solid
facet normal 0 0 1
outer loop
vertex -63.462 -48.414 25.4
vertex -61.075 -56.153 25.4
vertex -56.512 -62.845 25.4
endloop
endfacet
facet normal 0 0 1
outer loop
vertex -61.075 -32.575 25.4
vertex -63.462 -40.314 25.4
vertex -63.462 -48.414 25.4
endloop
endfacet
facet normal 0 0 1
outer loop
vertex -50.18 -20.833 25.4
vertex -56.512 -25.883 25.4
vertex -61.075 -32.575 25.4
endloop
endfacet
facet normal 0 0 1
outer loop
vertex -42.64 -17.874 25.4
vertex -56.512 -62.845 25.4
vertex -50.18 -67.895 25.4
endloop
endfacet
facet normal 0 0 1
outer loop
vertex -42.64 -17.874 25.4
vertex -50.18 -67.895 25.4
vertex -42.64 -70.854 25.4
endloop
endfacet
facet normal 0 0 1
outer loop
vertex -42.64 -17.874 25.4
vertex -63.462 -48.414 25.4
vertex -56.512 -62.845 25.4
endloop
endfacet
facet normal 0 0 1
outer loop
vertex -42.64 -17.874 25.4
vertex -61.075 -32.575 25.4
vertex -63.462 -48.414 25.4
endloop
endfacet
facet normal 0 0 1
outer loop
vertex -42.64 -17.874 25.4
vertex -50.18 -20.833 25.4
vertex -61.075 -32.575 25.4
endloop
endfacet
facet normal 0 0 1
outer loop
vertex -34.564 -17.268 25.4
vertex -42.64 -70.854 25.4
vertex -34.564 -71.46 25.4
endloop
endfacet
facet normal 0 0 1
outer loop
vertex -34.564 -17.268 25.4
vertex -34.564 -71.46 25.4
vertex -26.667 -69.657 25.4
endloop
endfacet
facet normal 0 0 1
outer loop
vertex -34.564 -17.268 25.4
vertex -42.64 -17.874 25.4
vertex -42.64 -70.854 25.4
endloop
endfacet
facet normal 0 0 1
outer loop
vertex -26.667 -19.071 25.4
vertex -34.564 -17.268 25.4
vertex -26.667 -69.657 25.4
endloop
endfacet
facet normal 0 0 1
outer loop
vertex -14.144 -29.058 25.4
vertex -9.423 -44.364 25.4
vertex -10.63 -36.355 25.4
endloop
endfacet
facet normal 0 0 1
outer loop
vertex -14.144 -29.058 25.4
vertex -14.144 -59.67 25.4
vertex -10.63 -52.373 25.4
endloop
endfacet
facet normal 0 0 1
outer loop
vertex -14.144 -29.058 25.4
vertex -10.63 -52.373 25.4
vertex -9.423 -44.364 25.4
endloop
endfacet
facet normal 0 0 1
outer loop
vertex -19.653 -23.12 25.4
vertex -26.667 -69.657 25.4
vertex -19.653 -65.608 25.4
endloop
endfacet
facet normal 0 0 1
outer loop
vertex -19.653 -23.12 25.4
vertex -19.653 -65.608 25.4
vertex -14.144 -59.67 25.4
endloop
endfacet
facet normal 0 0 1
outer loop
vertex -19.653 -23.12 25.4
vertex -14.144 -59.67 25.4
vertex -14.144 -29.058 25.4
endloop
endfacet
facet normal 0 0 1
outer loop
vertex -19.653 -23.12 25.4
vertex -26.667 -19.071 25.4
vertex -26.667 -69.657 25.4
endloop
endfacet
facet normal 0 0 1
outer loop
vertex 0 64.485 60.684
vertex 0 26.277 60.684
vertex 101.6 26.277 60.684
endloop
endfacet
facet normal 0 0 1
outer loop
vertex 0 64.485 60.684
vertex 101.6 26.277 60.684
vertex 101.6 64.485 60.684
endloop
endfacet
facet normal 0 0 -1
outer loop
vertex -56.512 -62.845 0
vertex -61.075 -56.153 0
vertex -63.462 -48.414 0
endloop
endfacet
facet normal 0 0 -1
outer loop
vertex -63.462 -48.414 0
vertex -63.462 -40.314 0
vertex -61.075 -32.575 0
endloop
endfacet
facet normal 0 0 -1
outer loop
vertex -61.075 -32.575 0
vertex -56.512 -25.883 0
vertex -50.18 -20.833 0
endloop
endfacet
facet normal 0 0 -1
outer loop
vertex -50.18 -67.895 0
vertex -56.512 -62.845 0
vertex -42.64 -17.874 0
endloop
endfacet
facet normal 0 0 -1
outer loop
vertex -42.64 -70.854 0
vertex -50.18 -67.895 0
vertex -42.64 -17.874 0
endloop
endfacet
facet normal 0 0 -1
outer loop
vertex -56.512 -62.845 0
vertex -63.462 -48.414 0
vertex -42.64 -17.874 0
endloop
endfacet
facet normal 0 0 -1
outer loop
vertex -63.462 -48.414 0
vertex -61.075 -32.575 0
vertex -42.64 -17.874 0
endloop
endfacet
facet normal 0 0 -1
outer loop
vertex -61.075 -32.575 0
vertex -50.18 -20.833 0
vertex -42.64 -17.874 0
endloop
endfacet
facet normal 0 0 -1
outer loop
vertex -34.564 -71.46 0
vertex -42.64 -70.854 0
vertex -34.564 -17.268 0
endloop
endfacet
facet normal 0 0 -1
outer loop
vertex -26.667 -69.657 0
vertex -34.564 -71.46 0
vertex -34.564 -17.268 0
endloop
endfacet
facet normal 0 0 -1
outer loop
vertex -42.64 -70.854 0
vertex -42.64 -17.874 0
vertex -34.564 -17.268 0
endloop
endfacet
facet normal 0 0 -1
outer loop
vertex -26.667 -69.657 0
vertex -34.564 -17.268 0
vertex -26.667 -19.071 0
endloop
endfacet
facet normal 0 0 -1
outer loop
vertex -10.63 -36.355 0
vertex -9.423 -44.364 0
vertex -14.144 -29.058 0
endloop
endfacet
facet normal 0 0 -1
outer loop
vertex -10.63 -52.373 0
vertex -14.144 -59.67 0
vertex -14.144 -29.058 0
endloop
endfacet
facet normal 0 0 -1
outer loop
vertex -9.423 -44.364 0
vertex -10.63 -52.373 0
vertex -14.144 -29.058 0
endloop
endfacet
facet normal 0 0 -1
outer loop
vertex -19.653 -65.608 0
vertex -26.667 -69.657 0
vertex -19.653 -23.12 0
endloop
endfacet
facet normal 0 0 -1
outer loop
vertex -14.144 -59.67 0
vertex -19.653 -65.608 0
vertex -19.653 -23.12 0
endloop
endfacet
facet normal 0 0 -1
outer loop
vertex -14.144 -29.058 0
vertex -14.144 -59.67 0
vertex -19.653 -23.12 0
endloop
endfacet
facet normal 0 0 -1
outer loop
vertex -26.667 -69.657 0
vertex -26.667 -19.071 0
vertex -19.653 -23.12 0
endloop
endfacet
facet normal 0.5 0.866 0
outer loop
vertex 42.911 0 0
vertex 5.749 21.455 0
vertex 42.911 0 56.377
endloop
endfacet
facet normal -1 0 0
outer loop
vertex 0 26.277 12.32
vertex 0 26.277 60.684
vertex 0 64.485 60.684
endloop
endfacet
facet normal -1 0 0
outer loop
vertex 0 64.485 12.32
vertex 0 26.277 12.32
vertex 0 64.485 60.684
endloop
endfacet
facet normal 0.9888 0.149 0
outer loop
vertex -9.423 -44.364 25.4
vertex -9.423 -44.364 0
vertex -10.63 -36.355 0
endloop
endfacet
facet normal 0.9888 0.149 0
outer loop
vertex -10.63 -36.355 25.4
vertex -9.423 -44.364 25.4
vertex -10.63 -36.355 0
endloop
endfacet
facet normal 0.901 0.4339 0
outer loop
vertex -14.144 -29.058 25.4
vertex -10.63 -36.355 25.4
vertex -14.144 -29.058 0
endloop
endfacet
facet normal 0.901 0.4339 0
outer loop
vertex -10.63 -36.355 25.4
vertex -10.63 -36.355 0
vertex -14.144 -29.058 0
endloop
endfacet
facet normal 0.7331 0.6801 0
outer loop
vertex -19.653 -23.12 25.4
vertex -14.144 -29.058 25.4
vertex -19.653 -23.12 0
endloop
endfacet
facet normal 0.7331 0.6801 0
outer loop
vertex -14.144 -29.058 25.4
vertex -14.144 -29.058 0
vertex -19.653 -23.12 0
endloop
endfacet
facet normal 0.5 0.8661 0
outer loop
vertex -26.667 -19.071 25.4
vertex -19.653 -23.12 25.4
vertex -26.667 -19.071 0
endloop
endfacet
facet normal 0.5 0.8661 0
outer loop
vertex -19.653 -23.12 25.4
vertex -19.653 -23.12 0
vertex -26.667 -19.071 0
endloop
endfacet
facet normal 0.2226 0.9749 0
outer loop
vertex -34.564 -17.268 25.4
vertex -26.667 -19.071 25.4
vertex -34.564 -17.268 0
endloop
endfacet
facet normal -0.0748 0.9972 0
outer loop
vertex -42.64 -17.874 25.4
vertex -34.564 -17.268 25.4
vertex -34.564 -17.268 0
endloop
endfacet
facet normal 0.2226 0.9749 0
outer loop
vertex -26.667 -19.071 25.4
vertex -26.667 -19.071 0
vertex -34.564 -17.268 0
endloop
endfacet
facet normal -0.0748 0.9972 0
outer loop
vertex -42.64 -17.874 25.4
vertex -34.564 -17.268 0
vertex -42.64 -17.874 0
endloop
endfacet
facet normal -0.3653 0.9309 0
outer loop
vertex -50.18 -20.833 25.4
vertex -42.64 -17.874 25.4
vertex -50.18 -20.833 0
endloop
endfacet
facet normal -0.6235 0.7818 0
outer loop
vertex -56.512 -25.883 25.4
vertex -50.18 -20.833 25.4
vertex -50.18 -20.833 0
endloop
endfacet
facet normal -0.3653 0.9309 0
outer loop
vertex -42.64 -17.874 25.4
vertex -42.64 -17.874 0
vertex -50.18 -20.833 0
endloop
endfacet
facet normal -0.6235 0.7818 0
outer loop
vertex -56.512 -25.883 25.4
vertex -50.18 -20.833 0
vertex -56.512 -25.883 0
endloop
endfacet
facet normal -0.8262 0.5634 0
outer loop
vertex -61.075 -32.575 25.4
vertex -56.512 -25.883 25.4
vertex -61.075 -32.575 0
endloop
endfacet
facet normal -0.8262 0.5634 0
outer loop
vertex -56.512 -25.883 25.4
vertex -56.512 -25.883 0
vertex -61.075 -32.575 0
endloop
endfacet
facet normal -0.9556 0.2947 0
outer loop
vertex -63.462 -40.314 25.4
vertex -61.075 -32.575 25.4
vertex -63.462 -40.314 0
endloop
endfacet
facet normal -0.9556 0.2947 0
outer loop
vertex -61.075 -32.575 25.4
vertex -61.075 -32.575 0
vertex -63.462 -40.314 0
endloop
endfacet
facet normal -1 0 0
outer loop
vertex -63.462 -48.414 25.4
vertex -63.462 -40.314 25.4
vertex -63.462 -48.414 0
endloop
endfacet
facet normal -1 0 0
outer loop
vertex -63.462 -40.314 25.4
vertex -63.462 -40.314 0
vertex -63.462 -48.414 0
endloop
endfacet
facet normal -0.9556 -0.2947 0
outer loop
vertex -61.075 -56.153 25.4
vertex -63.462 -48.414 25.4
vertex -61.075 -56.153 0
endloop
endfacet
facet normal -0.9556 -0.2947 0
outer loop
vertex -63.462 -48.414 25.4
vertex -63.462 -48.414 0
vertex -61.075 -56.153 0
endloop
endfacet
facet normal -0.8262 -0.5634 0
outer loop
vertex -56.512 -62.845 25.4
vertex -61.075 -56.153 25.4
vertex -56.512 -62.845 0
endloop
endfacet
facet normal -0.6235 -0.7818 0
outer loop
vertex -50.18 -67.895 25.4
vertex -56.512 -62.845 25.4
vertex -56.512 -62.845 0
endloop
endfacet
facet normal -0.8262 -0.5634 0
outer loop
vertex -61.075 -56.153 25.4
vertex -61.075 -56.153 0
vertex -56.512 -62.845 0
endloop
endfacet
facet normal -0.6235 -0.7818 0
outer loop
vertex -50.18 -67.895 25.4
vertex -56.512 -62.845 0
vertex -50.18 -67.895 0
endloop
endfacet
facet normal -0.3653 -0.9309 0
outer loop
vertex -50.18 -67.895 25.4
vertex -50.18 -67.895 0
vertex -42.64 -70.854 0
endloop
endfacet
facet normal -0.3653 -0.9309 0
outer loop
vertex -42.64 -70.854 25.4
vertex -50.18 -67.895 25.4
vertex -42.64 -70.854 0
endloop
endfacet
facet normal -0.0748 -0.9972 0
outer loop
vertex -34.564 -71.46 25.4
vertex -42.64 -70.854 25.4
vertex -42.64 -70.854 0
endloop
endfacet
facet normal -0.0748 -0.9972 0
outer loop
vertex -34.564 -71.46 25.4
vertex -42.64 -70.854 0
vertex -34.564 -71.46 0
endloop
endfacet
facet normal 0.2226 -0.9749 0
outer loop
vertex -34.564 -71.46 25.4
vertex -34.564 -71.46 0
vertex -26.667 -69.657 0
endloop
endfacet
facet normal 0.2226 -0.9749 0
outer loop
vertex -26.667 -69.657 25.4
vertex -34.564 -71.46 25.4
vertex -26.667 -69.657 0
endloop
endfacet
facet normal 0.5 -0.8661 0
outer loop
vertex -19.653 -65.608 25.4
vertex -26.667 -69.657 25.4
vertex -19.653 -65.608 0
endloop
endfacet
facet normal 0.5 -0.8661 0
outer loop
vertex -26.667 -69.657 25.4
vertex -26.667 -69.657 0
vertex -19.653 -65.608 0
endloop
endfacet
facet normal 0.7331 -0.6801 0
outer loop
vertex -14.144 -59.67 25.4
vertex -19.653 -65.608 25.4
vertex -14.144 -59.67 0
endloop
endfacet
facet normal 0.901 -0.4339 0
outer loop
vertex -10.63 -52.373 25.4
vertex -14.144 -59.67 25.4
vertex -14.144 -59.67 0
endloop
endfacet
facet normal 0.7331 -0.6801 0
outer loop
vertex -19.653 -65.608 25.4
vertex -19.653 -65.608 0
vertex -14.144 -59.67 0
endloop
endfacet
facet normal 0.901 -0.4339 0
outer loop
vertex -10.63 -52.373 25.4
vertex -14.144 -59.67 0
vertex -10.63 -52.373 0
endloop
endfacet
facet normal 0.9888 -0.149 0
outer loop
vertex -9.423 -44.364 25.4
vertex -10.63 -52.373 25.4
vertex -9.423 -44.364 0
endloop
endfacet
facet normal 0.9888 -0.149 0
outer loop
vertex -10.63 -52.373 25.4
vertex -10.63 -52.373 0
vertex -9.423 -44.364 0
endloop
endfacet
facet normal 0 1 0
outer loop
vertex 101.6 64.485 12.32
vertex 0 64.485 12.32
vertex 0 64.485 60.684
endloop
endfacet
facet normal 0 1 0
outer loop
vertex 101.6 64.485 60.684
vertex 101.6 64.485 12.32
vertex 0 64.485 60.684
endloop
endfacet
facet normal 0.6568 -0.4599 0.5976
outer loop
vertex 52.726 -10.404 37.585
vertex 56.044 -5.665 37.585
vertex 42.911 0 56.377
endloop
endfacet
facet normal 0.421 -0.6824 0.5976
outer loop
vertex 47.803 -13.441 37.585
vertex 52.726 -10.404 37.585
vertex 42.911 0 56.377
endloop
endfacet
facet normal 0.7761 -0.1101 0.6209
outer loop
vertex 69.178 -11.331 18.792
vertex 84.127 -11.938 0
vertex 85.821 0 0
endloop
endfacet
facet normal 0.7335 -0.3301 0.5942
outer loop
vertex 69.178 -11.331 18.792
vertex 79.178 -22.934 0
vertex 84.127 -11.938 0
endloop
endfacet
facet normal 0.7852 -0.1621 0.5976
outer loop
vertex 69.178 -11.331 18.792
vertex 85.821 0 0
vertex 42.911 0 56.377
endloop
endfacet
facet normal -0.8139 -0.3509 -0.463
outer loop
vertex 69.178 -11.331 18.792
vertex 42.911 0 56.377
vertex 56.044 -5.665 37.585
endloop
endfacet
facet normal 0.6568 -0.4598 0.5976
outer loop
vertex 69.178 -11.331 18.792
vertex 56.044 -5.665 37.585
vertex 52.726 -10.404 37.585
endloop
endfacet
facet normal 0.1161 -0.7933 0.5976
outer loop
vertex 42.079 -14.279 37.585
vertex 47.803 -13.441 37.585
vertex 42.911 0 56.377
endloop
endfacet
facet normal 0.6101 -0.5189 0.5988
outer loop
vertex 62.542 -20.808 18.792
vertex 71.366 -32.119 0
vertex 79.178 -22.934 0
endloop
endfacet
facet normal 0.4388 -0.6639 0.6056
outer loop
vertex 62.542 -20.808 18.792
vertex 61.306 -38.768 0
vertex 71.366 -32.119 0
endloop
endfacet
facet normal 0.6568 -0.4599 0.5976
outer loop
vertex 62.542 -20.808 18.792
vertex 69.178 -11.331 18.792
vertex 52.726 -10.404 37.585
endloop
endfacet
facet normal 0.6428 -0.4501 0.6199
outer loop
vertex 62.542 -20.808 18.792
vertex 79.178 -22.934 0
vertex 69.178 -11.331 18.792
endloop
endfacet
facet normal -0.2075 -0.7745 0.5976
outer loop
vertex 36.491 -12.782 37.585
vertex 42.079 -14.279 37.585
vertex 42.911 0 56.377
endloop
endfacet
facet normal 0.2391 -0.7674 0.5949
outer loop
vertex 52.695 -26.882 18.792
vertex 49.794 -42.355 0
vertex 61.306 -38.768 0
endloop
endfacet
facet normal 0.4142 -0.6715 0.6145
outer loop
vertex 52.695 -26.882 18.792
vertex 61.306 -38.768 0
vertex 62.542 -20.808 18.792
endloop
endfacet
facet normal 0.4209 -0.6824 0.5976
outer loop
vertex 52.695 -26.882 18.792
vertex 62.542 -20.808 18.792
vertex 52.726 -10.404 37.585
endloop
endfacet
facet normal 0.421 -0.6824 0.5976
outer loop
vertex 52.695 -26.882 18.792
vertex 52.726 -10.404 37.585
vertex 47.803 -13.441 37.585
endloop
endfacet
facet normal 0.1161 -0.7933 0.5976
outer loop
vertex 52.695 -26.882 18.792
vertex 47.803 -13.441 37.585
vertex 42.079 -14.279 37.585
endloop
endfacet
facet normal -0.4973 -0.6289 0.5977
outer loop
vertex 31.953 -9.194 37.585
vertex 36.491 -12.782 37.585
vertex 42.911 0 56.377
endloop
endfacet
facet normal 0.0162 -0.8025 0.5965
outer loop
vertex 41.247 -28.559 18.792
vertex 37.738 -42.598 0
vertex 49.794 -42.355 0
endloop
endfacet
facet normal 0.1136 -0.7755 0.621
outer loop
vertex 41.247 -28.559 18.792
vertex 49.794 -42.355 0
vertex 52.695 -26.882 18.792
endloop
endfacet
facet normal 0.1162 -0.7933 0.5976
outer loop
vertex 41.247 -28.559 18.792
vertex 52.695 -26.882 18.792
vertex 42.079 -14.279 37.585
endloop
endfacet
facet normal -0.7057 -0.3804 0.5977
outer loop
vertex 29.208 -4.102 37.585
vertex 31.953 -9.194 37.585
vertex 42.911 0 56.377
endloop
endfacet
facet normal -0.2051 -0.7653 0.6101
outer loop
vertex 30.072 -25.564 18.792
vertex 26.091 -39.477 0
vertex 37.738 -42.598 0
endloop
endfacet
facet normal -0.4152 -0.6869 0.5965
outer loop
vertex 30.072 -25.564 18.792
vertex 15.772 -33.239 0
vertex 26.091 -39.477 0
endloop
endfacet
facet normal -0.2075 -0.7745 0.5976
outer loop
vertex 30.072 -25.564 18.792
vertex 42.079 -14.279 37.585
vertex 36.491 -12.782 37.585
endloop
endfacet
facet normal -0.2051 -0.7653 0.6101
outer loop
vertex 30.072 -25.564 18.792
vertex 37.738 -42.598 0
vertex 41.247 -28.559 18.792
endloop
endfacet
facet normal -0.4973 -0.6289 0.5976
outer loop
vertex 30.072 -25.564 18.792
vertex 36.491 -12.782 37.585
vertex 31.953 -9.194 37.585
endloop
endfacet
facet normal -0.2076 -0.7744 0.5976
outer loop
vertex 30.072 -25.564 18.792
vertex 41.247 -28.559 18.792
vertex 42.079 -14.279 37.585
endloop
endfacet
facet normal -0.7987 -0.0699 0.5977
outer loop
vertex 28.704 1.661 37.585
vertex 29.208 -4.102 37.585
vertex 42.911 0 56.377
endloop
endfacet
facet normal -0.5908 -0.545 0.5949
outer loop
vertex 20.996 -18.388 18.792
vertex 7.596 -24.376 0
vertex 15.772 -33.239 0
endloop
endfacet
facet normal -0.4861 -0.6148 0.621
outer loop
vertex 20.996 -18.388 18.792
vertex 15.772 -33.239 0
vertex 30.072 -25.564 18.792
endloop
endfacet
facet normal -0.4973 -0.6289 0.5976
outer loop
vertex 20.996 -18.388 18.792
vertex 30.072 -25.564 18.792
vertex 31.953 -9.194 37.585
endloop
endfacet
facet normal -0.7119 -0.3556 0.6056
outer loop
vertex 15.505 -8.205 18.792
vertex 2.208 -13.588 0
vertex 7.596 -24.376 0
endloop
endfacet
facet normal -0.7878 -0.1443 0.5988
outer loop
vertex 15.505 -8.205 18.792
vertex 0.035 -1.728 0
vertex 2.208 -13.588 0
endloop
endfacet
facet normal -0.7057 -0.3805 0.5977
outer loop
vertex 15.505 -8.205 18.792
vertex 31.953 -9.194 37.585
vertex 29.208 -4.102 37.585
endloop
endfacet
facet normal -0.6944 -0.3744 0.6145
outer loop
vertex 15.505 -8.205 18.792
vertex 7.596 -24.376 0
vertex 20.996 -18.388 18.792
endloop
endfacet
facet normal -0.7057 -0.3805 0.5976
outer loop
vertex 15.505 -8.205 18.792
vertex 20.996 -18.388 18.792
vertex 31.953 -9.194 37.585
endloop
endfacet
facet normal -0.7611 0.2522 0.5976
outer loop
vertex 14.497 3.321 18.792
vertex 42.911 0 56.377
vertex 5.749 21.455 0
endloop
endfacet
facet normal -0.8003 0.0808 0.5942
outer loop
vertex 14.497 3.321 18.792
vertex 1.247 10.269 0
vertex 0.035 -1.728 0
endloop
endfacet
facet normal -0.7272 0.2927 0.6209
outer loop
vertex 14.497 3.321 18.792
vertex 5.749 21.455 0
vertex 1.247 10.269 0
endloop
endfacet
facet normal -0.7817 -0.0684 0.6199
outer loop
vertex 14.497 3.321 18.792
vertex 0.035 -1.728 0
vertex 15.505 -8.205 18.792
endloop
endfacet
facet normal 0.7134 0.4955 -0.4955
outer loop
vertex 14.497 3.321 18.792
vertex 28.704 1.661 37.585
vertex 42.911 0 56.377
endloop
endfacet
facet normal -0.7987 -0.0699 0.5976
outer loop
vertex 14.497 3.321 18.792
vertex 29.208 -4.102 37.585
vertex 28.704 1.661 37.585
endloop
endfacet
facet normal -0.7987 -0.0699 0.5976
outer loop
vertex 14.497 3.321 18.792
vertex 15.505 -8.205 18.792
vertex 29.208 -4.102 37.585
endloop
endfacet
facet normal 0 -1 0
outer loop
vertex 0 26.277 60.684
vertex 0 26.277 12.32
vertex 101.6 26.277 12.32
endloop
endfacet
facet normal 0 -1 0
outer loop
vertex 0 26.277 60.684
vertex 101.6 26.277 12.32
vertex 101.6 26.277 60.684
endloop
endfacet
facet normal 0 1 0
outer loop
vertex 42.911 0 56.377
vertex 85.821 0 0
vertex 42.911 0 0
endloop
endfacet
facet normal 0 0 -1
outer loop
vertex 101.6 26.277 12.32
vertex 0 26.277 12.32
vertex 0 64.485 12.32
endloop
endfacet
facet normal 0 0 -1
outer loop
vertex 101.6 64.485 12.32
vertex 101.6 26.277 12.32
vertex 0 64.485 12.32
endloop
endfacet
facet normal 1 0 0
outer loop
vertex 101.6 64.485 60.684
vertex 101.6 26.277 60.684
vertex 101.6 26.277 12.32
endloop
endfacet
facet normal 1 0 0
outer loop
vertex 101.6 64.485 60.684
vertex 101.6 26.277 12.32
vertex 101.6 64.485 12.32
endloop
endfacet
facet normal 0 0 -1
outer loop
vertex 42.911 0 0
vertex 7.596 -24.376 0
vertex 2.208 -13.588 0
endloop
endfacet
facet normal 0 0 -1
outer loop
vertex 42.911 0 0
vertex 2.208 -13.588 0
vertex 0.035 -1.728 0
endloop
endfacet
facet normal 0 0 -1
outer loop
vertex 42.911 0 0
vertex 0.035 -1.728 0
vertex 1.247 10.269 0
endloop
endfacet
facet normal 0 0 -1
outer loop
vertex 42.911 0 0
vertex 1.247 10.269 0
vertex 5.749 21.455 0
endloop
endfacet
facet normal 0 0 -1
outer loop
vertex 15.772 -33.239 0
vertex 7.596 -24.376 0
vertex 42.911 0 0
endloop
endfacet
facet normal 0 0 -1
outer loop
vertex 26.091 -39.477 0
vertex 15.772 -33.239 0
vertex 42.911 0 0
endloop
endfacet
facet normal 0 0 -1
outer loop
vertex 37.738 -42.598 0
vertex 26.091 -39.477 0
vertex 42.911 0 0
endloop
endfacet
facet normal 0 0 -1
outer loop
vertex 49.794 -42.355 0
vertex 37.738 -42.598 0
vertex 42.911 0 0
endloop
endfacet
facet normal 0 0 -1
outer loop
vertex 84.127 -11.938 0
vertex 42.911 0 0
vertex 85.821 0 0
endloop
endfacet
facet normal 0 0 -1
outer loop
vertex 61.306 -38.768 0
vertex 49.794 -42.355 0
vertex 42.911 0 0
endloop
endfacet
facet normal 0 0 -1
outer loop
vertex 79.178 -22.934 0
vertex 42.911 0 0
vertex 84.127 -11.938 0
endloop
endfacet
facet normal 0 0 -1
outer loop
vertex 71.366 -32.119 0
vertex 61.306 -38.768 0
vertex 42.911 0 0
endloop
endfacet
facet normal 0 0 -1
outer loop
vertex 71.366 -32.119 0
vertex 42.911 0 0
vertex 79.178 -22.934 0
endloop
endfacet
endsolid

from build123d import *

# Parameters (mm, degrees)
F1_ANGLE_BACK = 180
F1_ANGLE      = 210
F2_W          = 38.2075756788
F2_H          = 48.3640171587
F3_DEPTH      = 101.6
F4_R          = 27.1714932238
F5_DEPTH      = 25.4


with BuildPart() as f1:
    # F0 (on Front) → F1 (revolve)
    with BuildSketch(Plane.XZ, mode=Mode.PRIVATE) as f1_sk:
        Polygon((42.910579592, 56.3772022724), (0, 0), (42.910579592, 0), align=None)
    revolve(f1_sk.sketch.rotate(Axis((42.910579592, 0, 28.1886011362), (0, 0, -1)), -F1_ANGLE_BACK), axis=Axis((42.910579592, 0, 28.1886011362), (0, 0, -1)), revolution_arc=F1_ANGLE)


with BuildPart() as f3:
    # F2 (on Right) → F3 (new body)
    with BuildSketch(Plane.YZ):
        with Locations((45.3808382154, 36.5022923797)):
            Rectangle(F2_W, F2_H)
    extrude(amount=F3_DEPTH)


with BuildPart() as f5:
    # F4 (on Top) → F5 (new body)
    with BuildSketch(Plane.XY):
        with Locations((-36.5940481424, -44.3640127778)):
            Circle(F4_R)
    extrude(amount=F5_DEPTH)


solid = Compound([f1.part, f3.part, f5.part])
